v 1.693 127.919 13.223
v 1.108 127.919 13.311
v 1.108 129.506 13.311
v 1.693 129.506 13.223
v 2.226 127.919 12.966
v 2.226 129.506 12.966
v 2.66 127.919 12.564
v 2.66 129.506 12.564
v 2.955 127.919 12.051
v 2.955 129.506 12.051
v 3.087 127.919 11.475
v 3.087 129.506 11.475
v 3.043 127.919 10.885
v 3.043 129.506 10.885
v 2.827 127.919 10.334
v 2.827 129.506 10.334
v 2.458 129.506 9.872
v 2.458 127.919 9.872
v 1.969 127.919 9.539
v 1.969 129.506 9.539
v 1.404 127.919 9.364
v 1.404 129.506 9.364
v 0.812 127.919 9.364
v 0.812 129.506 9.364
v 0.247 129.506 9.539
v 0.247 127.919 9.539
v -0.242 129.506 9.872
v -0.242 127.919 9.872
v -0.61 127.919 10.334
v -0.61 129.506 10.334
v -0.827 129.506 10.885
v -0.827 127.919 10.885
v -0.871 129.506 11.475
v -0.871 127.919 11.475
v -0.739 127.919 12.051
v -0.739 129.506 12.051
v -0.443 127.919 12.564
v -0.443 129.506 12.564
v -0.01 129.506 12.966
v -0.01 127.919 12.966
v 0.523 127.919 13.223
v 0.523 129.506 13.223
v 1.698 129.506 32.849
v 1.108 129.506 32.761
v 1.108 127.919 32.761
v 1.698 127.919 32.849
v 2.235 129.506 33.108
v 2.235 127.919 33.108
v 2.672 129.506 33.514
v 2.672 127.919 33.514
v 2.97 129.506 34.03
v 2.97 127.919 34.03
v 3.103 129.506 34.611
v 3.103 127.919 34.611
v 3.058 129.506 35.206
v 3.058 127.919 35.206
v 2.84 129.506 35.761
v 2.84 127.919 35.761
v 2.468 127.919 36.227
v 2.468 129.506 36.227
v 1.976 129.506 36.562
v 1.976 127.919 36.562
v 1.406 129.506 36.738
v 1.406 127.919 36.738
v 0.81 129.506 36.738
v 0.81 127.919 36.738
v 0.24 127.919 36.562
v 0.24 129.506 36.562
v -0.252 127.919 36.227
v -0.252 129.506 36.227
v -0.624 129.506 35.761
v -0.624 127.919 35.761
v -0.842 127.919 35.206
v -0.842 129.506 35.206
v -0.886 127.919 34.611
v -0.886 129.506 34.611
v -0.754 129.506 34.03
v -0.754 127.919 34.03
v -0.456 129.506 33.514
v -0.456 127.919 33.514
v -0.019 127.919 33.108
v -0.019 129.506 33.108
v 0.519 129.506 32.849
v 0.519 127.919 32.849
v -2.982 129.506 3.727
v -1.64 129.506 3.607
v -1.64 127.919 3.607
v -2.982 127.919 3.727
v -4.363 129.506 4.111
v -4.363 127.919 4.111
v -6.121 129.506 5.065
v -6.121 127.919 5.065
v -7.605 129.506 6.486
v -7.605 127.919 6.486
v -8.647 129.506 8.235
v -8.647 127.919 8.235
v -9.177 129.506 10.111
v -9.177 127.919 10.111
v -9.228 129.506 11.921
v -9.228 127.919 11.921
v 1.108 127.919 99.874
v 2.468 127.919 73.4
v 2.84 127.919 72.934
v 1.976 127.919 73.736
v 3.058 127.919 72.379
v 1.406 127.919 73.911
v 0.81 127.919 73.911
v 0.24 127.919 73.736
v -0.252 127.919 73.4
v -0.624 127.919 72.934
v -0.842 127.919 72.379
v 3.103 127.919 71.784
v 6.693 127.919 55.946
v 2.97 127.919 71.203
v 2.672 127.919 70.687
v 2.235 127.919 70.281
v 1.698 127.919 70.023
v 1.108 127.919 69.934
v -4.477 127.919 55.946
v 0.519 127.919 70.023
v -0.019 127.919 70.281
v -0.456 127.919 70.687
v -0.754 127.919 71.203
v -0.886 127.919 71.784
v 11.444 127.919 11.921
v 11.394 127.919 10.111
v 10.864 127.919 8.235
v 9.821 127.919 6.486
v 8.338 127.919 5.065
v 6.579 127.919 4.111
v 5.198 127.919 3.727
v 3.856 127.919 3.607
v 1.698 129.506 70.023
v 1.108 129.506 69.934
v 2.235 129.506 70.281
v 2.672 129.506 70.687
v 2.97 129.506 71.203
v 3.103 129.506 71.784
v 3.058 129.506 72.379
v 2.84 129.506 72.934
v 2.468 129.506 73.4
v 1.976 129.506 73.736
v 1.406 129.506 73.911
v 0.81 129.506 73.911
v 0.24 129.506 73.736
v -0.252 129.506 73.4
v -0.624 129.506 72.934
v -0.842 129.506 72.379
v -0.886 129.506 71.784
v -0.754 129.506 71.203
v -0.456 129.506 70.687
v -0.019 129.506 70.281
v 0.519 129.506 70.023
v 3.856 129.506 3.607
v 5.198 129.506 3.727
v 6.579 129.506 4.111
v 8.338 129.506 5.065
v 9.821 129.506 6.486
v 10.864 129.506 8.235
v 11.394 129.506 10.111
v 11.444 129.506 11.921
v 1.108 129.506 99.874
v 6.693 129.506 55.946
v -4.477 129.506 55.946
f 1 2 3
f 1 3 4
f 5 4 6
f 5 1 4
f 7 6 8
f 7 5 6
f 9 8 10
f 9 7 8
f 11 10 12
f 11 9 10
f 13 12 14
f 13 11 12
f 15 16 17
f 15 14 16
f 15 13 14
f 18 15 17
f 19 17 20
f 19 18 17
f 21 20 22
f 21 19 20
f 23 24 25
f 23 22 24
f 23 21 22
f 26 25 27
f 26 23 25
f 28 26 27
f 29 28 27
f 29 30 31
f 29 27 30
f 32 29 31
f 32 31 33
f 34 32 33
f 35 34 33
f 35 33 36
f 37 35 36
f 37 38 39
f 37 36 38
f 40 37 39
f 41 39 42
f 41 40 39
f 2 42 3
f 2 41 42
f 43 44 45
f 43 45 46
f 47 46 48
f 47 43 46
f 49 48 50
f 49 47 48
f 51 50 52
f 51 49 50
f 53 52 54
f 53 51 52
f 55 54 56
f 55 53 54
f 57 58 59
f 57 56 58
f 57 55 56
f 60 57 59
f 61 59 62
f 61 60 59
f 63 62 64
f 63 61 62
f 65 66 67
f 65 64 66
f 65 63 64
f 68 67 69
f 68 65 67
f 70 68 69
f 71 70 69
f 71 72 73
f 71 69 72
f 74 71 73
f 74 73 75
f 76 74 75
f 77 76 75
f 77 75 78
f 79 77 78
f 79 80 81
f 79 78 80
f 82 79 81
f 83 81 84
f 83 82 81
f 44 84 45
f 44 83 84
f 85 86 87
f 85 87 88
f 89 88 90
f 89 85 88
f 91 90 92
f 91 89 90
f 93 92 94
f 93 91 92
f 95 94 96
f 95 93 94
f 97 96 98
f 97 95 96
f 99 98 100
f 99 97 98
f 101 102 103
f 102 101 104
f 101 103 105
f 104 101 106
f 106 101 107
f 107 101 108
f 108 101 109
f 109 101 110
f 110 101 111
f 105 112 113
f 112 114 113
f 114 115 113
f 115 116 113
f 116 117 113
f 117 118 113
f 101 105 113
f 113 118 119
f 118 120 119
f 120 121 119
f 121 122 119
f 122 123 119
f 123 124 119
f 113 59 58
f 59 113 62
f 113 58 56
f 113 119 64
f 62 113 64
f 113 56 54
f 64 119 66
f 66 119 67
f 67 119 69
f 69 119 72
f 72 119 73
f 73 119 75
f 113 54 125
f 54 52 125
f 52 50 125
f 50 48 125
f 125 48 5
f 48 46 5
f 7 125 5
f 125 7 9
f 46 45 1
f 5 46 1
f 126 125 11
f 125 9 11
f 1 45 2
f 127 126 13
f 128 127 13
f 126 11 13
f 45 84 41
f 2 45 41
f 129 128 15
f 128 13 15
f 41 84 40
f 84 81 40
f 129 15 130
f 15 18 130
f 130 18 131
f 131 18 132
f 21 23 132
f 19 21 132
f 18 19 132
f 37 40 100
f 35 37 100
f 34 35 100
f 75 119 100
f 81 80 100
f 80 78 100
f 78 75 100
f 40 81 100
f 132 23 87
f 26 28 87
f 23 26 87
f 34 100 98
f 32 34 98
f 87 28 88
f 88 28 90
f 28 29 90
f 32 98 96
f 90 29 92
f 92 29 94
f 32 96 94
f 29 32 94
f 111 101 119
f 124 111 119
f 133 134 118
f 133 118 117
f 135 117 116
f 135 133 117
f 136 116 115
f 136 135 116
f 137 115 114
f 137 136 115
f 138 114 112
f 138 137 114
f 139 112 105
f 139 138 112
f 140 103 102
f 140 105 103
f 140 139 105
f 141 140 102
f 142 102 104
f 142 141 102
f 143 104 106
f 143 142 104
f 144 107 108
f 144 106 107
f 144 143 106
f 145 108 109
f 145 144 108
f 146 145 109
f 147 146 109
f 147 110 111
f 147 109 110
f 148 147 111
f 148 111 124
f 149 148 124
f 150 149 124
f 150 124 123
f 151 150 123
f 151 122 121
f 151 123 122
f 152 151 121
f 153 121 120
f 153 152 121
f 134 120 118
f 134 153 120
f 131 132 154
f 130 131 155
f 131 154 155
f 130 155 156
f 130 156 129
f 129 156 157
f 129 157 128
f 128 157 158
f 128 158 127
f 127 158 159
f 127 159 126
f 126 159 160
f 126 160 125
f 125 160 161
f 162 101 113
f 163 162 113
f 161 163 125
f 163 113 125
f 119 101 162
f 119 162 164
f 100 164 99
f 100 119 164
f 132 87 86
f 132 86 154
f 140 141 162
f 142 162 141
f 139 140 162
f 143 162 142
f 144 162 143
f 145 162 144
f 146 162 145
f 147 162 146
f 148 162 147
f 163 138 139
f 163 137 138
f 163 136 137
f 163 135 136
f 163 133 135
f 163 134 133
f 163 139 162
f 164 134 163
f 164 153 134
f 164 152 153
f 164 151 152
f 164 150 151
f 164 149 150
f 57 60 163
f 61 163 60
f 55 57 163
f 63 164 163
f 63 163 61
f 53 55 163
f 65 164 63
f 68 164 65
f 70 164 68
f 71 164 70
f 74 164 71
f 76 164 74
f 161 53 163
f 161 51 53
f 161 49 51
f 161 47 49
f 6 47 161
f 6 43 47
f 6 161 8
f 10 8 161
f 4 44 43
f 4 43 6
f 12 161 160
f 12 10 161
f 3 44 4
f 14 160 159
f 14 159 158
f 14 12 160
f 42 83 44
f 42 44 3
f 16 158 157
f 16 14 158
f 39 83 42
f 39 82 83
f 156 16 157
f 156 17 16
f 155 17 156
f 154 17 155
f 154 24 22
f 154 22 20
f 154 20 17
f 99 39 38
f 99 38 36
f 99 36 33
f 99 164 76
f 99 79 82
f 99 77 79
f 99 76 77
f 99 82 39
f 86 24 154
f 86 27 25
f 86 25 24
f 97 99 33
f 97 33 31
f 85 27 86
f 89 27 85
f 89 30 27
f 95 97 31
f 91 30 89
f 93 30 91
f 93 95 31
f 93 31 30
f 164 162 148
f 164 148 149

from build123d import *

# Parameters (mm, degrees)
SKETCH1_R               = 1.984375
BOSS_EXTRUDE1_DEPTH     = 169.87265999999997
CUT_EXTRUDE1_DEPTH      = 23.05812
CUT_EXTRUDE2_START      = -169.87266
CUT_EXTRUDE2_DEPTH      = 23.05812
FILLET1_R               = 7.62
CUT_EXTRUDE3_DEPTH      = 198.3909425992125
CUT_EXTRUDE3_DEPTH_BACK = 198.3909425992125
SKETCH6_R               = 2.000000000000001
SKETCH6_R_2             = 2.0000000000000004
CUT_EXTRUDE4_DEPTH      = 198.3909425992125
CUT_EXTRUDE4_DEPTH_BACK = 198.3909425992125
SKETCH7_W               = 96.26632678346117
SKETCH7_H               = 127.9185977098139
SKETCH7_H_2             = 40.36656229018607


with BuildPart() as part:
    # Sketch1 → Boss-Extrude1 (new body)
    with BuildSketch(Plane(origin=(0, 0, 0), x_dir=(1, 0, 0), z_dir=(0, 1, 0))):
        with BuildLine():
            Line((-9.955287346489113, -3.6074515728352274), (-6.769721367669625, -3.607451572835229))
            Line((-6.769721367669625, -3.607451572835229), (8.985913588520251, -3.607451572835254))
            Line((8.985913588520251, -3.607451572835254), (12.171479567676489, -3.6074515728352536))
            add(Edge.make_bspline(
                [(10.60289964969583, -20.752451572835255), (11.099968974105764, -15.73020157118813), (11.63056361676114, -10.016003165571298), (12.113997871046978, -4.296816952278091), (12.171479567676489, -3.6074515728352536)],
                knots=[0.38496962590391054, 0.38496962590391054, 0.38496962590391054, 0.38496962590391054, 0.4581086713676085, 0.468131593311824, 0.468131593311824, 0.468131593311824, 0.468131593311824], degree=3))
            add(Edge.make_bspline(
                [(1.1080961105936413, -99.87377835629641), (4.527344743513003, -73.53176416291807), (7.98655990047842, -47.18721965154313), (10.60289964969583, -20.752451572835255)],
                knots=[0, 0, 0, 0, 0.38496962590391054, 0.38496962590391054, 0.38496962590391054, 0.38496962590391054], degree=3))
            add(Edge.make_bspline(
                [(1.1080961105936413, -99.87377835629641), (-2.311152522316452, -73.53176416292023), (-5.77036767929202, -47.18721965154205), (-8.386707428509173, -20.752451572835213)],
                knots=[0, 0, 0, 0, 0.3849696259039116, 0.3849696259039116, 0.3849696259039116, 0.3849696259039116], degree=3))
            add(Edge.make_bspline(
                [(-8.386707428509173, -20.752451572835213), (-8.88377675291906, -15.730201571188243), (-9.414371395575616, -10.016003165551764), (-9.897805649859515, -4.296816952279357), (-9.955287346489113, -3.6074515728352274)],
                knots=[0.3849696259039116, 0.3849696259039116, 0.3849696259039116, 0.3849696259039116, 0.4581086713676079, 0.46813159331185, 0.46813159331185, 0.46813159331185, 0.46813159331185], degree=3))
        make_face()
        with Locations(Location((1.10810856874065, -11.326456678177, 0), (0, 0, 270))):
            Circle(SKETCH1_R, mode=Mode.SUBTRACT)
    extrude(amount=BOSS_EXTRUDE1_DEPTH)

    # Sketch2 → Cut-Extrude1 (cut)
    with BuildSketch(Plane(origin=(0, 169.87265999999997, 0), x_dir=(1, 0, 0), z_dir=(0, 1, 0))):
        Polygon((-9.955287346489113, -3.6074515728352274), (25.808519749497883, -3.6074515728352274), (25.808519749497883, -26.312456678177), (-9.95528734648911, -26.312456678177), align=None)
    extrude(amount=-CUT_EXTRUDE1_DEPTH, mode=Mode.SUBTRACT)

    # Sketch2<2> → Cut-Extrude2 (cut)
    with BuildSketch(Plane(origin=(0, 169.87265999999997, 0), x_dir=(1, 0, 0), z_dir=(0, 1, 0)).offset(CUT_EXTRUDE2_START)):
        Polygon((-9.955287346489113, -3.6074515728352274), (25.808519749497883, -3.6074515728352274), (25.808519749497883, -26.312456678177), (-9.95528734648911, -26.312456678177), align=None)
    extrude(amount=CUT_EXTRUDE2_DEPTH, mode=Mode.SUBTRACT)

    # Fillet1
    fillet1_edges = [part.edges().sort_by_distance(p)[0] for p in [
        (-7.8241553741226255, 11.529059999999971, 26.312456678177),
        (10.040347595309392, 11.529059999999971, 26.312456678177),
        (-9.955287346489113, 84.93632999999997, 3.6074515728352274),
        (12.171479567676489, 84.93632999999997, 3.6074515728352536),
        (-7.8241553741226255, 158.34359999999998, 26.312456678177),
        (10.040347595309392, 158.34359999999998, 26.312456678177),
    ]]
    fillet(fillet1_edges, radius=FILLET1_R)

    # Sketch6 → Cut-Extrude3 (cut, two sides: drawn at the far end of the back side and taken through both)
    with BuildSketch(Plane.XZ.offset(-CUT_EXTRUDE3_DEPTH_BACK)):
        with Locations(Location((1.1080961105936413, 71.9337783562964, 0), (0, 0, 270))):
            Circle(SKETCH6_R)
        with Locations(Location((1.1080961105935272, 34.76055213743882, 0), (0, 0, 270))):
            Circle(SKETCH6_R_2)
    extrude(amount=CUT_EXTRUDE3_DEPTH + CUT_EXTRUDE3_DEPTH_BACK, mode=Mode.SUBTRACT)

    # Sketch7 → Cut-Extrude4 (cut, two sides: drawn at the far end of the back side and taken through both)
    with BuildSketch(Plane(origin=(0, 0, 0), x_dir=(0, 0, -1), z_dir=(1, 0, 0)).offset(-CUT_EXTRUDE4_DEPTH_BACK)):
        with Locations((-51.740614964565815, 63.95929885490695)):
            Rectangle(SKETCH7_W, SKETCH7_H)
        with Locations((-51.740614964565815, 149.68937885490692)):
            Rectangle(SKETCH7_W, SKETCH7_H_2)
    extrude(amount=CUT_EXTRUDE4_DEPTH + CUT_EXTRUDE4_DEPTH_BACK, mode=Mode.SUBTRACT)


solid = part.part
